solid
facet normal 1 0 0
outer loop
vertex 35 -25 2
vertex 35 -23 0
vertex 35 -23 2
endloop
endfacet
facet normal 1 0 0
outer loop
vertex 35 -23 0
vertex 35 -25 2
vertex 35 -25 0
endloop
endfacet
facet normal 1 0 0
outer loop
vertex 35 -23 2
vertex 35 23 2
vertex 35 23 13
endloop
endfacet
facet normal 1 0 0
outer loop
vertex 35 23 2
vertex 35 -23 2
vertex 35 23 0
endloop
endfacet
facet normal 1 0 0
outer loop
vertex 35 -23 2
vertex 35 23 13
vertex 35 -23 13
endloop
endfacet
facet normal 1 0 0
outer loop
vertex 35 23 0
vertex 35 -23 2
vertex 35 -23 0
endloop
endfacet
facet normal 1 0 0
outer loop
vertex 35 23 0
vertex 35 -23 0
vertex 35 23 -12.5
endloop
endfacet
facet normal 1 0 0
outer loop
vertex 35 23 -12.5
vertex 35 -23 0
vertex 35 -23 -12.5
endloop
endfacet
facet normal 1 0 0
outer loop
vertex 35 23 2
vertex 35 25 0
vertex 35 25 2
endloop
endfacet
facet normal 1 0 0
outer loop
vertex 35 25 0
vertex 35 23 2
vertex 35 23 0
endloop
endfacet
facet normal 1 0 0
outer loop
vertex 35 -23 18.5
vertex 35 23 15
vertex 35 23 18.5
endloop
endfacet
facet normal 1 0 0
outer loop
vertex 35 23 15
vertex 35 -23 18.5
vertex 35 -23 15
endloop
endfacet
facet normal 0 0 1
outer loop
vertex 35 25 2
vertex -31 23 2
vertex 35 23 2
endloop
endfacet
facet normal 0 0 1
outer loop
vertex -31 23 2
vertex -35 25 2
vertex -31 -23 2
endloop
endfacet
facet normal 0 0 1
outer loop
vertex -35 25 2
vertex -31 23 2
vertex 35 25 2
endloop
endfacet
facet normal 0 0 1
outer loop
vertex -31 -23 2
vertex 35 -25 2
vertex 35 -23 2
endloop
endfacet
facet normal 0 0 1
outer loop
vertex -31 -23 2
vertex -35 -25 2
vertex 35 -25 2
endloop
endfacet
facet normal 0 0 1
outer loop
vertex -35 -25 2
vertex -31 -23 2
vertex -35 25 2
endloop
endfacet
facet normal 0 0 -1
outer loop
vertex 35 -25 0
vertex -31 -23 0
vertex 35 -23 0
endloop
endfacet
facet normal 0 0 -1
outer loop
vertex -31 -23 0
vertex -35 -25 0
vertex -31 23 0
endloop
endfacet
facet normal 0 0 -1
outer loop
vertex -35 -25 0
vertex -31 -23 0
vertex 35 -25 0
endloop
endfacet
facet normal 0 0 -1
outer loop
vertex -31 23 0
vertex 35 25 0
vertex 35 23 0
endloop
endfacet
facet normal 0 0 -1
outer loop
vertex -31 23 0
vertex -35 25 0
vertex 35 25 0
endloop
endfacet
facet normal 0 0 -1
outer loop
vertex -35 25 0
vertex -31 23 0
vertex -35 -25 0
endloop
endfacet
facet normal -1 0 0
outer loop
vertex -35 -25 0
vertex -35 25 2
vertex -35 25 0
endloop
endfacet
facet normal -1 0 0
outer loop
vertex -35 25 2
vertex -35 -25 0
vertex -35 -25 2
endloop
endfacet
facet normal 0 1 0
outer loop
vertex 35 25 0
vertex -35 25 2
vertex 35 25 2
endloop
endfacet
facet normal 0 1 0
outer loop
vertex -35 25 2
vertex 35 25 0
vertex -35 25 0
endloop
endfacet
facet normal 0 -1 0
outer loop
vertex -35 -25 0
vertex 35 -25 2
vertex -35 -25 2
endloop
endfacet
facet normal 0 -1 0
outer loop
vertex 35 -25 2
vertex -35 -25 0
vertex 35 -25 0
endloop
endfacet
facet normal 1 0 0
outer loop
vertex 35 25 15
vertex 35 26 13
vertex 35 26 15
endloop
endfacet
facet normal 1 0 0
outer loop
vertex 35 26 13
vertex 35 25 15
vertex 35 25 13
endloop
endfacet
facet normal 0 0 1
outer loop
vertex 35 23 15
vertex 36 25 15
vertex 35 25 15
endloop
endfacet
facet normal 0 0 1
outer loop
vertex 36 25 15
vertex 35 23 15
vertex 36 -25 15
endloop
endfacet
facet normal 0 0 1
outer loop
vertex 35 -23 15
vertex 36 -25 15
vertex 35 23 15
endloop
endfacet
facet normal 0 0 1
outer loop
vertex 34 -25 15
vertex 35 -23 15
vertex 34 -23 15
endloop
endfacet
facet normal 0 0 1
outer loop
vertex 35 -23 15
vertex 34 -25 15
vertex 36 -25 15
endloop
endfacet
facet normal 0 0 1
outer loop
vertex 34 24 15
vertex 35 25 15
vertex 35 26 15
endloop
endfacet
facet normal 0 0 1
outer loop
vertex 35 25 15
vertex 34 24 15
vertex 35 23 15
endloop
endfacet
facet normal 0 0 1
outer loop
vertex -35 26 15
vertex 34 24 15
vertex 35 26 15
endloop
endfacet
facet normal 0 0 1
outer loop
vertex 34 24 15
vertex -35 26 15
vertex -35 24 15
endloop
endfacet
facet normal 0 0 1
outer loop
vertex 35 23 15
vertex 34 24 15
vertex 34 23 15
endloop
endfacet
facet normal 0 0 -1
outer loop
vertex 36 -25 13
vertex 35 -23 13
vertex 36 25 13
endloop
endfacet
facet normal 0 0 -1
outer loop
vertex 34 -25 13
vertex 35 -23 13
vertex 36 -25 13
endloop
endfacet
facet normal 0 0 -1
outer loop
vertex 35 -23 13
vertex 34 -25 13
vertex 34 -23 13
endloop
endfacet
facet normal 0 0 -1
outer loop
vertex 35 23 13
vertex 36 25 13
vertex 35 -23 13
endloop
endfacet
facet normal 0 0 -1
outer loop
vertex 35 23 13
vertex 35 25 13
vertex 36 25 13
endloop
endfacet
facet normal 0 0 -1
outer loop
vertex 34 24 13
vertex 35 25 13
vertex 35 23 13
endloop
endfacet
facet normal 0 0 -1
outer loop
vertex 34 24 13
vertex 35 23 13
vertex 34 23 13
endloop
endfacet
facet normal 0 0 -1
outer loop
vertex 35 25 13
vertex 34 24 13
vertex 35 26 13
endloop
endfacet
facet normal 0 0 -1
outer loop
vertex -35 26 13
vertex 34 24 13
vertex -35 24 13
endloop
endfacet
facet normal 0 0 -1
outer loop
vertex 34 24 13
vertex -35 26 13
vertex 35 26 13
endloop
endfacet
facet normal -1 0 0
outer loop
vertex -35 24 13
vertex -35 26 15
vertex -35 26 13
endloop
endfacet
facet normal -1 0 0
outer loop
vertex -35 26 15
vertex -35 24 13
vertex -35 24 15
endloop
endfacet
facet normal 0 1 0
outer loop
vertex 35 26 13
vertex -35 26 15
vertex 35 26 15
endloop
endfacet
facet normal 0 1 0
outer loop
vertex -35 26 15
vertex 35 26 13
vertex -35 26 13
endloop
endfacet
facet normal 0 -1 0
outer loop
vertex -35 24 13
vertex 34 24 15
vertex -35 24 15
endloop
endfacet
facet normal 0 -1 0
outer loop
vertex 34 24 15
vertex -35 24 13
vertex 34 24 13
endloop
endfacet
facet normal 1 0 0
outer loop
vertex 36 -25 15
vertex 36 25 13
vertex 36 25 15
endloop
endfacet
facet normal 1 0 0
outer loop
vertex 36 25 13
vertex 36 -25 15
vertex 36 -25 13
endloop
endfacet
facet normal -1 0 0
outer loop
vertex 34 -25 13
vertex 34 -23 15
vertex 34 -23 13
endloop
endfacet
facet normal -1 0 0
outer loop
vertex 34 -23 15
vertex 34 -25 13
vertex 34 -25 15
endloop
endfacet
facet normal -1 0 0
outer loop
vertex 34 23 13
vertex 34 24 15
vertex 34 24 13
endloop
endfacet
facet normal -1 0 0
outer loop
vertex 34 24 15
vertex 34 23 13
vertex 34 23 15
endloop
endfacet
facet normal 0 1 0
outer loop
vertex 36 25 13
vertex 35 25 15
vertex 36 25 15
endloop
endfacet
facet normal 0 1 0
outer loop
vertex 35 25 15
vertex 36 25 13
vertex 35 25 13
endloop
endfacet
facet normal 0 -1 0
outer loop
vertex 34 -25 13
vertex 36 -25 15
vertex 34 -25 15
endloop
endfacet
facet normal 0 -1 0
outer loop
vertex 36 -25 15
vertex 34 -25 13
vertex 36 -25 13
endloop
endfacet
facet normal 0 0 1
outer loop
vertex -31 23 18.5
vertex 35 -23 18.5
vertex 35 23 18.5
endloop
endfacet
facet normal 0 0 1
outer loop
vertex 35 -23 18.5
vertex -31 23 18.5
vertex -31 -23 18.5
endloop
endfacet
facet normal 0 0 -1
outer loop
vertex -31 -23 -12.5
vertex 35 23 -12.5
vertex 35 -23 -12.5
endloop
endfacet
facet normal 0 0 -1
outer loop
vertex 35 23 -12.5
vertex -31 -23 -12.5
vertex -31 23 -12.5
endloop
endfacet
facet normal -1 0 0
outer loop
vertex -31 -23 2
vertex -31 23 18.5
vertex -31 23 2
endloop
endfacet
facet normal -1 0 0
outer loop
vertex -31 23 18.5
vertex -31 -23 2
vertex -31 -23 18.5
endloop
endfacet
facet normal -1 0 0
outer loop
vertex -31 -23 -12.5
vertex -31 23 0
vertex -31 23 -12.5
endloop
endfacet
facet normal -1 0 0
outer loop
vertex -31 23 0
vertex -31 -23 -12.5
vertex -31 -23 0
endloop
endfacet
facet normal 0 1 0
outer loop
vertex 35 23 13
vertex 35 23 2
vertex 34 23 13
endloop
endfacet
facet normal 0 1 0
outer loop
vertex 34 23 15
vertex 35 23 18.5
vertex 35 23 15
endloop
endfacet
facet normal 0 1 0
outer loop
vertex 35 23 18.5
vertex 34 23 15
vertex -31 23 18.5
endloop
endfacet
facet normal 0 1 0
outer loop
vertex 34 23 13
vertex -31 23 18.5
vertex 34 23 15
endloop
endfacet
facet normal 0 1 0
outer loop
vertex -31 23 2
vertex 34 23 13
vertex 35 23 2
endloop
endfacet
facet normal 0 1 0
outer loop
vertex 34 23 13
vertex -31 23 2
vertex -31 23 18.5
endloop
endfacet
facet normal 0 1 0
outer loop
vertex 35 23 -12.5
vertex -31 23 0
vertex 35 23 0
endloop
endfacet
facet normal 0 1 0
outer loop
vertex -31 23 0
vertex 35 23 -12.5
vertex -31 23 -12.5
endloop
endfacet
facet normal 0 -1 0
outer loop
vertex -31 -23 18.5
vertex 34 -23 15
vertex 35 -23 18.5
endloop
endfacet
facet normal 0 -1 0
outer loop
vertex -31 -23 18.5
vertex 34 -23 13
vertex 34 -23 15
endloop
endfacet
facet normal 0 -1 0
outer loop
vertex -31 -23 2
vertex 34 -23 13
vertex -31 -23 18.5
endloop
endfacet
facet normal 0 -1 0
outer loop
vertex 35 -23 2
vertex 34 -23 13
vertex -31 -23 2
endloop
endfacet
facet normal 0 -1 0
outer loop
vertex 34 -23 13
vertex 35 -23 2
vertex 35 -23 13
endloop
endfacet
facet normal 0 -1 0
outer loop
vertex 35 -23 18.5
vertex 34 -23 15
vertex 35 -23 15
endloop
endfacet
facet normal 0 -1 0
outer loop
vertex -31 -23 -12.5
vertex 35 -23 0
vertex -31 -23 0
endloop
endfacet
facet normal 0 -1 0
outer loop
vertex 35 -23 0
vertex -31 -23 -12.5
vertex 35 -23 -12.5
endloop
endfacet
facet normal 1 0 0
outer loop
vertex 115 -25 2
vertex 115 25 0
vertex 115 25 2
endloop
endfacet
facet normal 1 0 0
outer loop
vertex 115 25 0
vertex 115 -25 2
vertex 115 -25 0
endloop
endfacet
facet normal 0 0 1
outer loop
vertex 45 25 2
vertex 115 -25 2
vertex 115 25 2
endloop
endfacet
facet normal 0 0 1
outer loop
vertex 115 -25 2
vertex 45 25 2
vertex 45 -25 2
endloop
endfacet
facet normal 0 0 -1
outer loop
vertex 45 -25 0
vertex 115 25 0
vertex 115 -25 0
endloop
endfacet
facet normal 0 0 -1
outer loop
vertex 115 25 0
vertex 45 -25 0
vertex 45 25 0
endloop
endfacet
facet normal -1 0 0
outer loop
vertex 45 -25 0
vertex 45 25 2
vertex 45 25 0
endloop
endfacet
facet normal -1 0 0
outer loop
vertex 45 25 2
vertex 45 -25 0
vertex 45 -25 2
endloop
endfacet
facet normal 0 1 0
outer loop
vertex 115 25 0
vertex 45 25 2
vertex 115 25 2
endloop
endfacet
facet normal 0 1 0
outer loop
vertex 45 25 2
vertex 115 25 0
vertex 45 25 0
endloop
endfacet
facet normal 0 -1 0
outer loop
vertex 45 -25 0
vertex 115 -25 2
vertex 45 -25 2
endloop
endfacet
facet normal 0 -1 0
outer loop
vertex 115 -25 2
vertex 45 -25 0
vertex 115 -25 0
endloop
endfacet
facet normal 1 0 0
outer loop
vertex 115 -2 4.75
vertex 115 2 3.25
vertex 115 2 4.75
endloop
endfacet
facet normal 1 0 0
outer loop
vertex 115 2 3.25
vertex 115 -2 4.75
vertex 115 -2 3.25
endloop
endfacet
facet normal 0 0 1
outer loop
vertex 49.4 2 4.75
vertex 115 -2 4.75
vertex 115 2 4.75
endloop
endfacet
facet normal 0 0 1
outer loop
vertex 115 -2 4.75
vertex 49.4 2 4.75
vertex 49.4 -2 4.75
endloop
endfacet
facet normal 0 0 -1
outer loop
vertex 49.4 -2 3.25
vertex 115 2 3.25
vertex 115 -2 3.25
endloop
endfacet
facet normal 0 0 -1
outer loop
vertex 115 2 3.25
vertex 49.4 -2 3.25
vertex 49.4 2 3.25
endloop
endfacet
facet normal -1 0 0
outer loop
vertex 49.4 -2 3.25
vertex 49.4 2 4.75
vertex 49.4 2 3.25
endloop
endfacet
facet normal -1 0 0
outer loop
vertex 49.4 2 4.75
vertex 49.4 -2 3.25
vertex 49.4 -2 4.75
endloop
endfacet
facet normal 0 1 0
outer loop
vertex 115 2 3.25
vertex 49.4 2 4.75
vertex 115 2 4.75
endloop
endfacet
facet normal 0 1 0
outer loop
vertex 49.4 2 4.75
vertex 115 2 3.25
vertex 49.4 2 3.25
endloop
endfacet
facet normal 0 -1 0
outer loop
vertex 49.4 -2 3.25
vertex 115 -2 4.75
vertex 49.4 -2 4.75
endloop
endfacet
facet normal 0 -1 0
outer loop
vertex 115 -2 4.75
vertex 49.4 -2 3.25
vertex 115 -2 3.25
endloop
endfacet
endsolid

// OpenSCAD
$fn = 64;

// --- Dimensions (mm) ---
// Part 1: The Box
box_w = 70;
box_h = 50;
box_d = 30;
wall_thick = 2;
floor_thick = 2;
open_top = true;

// Part 2: The Lid
lid_w = 70;
lid_h = 50;
lid_thick = 2;
lip_h = 4;
lip_thick = 1.5;
lip_clearance = 0.2;

// Assembly
gap = 10;
lid_offset = box_w + gap;

// --- Part 1: The Box ---
module part1_box() {
    // Outer dimensions
    outer_w = box_w;
    outer_h = box_h;
    outer_d = box_d;
    
    // Inner dimensions (subtract walls)
    inner_w = outer_w - (wall_thick * 2);
    inner_h = outer_h - (wall_thick * 2);
    inner_d = outer_d - (wall_thick * 2);
    
    // Floor height
    floor_h = floor_thick;
    
    // Cutout for the lid (slightly larger than lid outer size for clearance)
    // Lid outer size is 65.6 x 45.6
    cutout_w = 65.6 + (lip_clearance * 2);
    cutout_h = 45.6 + (lip_clearance * 2);
    
    // Cutout depth (goes through the floor and wall)
    cutout_d = outer_d + 1;
    
    // Cutout height (from floor up)
    cutout_h_from_floor = 1;
    
    union() {
        // Floor
        translate([0, 0, floor_h / 2])
            cube([outer_w, outer_h, floor_thick], center = true);
            
        // Walls
        // Front/Back
        translate([0, outer_h / 2, (outer_d / 2) - (wall_thick / 2)])
            cube([outer_w, wall_thick, wall_thick], center = true);
            
        // Left/Right
        translate([outer_w / 2, 0, (outer_d / 2) - (wall_thick / 2)])
            cube([wall_thick, outer_h, wall_thick], center = true);
            
        // Cutout for the lid
        // Positioned at the +X side of the box
        translate([(outer_w / 2) - (cutout_w / 2), 0, floor_h + cutout_h_from_floor])
            cube([cutout_w, cutout_h, cutout_d], center = true);
    }
}

// --- Part 2: The Lid ---
module part2_lid() {
    // Outer dimensions
    outer_w = lid_w;
    outer_h = lid_h;
    
    // Lip dimensions
    lip_w = 65.6;
    lip_h = 4;
    lip_thick = 1.5;
    
    union() {
        // Main Plate
        translate([0, 0, lid_thick / 2])
            cube([outer_w, outer_h, lid_thick], center = true);
            
        // Lip (Rectangular wall on top)
        // Positioned at the +X side of the plate
        translate([(outer_w / 2) - (lip_w / 2), 0, lid_thick + (lip_h / 2)])
            cube([lip_w, lip_h, lip_thick], center = true);
    }
}

// --- Assembly ---
// Part 1 (Box) at origin
part1_box();

// Part 2 (Lid) shifted to the right
translate([lid_offset, 0, 0])
    part2_lid();
